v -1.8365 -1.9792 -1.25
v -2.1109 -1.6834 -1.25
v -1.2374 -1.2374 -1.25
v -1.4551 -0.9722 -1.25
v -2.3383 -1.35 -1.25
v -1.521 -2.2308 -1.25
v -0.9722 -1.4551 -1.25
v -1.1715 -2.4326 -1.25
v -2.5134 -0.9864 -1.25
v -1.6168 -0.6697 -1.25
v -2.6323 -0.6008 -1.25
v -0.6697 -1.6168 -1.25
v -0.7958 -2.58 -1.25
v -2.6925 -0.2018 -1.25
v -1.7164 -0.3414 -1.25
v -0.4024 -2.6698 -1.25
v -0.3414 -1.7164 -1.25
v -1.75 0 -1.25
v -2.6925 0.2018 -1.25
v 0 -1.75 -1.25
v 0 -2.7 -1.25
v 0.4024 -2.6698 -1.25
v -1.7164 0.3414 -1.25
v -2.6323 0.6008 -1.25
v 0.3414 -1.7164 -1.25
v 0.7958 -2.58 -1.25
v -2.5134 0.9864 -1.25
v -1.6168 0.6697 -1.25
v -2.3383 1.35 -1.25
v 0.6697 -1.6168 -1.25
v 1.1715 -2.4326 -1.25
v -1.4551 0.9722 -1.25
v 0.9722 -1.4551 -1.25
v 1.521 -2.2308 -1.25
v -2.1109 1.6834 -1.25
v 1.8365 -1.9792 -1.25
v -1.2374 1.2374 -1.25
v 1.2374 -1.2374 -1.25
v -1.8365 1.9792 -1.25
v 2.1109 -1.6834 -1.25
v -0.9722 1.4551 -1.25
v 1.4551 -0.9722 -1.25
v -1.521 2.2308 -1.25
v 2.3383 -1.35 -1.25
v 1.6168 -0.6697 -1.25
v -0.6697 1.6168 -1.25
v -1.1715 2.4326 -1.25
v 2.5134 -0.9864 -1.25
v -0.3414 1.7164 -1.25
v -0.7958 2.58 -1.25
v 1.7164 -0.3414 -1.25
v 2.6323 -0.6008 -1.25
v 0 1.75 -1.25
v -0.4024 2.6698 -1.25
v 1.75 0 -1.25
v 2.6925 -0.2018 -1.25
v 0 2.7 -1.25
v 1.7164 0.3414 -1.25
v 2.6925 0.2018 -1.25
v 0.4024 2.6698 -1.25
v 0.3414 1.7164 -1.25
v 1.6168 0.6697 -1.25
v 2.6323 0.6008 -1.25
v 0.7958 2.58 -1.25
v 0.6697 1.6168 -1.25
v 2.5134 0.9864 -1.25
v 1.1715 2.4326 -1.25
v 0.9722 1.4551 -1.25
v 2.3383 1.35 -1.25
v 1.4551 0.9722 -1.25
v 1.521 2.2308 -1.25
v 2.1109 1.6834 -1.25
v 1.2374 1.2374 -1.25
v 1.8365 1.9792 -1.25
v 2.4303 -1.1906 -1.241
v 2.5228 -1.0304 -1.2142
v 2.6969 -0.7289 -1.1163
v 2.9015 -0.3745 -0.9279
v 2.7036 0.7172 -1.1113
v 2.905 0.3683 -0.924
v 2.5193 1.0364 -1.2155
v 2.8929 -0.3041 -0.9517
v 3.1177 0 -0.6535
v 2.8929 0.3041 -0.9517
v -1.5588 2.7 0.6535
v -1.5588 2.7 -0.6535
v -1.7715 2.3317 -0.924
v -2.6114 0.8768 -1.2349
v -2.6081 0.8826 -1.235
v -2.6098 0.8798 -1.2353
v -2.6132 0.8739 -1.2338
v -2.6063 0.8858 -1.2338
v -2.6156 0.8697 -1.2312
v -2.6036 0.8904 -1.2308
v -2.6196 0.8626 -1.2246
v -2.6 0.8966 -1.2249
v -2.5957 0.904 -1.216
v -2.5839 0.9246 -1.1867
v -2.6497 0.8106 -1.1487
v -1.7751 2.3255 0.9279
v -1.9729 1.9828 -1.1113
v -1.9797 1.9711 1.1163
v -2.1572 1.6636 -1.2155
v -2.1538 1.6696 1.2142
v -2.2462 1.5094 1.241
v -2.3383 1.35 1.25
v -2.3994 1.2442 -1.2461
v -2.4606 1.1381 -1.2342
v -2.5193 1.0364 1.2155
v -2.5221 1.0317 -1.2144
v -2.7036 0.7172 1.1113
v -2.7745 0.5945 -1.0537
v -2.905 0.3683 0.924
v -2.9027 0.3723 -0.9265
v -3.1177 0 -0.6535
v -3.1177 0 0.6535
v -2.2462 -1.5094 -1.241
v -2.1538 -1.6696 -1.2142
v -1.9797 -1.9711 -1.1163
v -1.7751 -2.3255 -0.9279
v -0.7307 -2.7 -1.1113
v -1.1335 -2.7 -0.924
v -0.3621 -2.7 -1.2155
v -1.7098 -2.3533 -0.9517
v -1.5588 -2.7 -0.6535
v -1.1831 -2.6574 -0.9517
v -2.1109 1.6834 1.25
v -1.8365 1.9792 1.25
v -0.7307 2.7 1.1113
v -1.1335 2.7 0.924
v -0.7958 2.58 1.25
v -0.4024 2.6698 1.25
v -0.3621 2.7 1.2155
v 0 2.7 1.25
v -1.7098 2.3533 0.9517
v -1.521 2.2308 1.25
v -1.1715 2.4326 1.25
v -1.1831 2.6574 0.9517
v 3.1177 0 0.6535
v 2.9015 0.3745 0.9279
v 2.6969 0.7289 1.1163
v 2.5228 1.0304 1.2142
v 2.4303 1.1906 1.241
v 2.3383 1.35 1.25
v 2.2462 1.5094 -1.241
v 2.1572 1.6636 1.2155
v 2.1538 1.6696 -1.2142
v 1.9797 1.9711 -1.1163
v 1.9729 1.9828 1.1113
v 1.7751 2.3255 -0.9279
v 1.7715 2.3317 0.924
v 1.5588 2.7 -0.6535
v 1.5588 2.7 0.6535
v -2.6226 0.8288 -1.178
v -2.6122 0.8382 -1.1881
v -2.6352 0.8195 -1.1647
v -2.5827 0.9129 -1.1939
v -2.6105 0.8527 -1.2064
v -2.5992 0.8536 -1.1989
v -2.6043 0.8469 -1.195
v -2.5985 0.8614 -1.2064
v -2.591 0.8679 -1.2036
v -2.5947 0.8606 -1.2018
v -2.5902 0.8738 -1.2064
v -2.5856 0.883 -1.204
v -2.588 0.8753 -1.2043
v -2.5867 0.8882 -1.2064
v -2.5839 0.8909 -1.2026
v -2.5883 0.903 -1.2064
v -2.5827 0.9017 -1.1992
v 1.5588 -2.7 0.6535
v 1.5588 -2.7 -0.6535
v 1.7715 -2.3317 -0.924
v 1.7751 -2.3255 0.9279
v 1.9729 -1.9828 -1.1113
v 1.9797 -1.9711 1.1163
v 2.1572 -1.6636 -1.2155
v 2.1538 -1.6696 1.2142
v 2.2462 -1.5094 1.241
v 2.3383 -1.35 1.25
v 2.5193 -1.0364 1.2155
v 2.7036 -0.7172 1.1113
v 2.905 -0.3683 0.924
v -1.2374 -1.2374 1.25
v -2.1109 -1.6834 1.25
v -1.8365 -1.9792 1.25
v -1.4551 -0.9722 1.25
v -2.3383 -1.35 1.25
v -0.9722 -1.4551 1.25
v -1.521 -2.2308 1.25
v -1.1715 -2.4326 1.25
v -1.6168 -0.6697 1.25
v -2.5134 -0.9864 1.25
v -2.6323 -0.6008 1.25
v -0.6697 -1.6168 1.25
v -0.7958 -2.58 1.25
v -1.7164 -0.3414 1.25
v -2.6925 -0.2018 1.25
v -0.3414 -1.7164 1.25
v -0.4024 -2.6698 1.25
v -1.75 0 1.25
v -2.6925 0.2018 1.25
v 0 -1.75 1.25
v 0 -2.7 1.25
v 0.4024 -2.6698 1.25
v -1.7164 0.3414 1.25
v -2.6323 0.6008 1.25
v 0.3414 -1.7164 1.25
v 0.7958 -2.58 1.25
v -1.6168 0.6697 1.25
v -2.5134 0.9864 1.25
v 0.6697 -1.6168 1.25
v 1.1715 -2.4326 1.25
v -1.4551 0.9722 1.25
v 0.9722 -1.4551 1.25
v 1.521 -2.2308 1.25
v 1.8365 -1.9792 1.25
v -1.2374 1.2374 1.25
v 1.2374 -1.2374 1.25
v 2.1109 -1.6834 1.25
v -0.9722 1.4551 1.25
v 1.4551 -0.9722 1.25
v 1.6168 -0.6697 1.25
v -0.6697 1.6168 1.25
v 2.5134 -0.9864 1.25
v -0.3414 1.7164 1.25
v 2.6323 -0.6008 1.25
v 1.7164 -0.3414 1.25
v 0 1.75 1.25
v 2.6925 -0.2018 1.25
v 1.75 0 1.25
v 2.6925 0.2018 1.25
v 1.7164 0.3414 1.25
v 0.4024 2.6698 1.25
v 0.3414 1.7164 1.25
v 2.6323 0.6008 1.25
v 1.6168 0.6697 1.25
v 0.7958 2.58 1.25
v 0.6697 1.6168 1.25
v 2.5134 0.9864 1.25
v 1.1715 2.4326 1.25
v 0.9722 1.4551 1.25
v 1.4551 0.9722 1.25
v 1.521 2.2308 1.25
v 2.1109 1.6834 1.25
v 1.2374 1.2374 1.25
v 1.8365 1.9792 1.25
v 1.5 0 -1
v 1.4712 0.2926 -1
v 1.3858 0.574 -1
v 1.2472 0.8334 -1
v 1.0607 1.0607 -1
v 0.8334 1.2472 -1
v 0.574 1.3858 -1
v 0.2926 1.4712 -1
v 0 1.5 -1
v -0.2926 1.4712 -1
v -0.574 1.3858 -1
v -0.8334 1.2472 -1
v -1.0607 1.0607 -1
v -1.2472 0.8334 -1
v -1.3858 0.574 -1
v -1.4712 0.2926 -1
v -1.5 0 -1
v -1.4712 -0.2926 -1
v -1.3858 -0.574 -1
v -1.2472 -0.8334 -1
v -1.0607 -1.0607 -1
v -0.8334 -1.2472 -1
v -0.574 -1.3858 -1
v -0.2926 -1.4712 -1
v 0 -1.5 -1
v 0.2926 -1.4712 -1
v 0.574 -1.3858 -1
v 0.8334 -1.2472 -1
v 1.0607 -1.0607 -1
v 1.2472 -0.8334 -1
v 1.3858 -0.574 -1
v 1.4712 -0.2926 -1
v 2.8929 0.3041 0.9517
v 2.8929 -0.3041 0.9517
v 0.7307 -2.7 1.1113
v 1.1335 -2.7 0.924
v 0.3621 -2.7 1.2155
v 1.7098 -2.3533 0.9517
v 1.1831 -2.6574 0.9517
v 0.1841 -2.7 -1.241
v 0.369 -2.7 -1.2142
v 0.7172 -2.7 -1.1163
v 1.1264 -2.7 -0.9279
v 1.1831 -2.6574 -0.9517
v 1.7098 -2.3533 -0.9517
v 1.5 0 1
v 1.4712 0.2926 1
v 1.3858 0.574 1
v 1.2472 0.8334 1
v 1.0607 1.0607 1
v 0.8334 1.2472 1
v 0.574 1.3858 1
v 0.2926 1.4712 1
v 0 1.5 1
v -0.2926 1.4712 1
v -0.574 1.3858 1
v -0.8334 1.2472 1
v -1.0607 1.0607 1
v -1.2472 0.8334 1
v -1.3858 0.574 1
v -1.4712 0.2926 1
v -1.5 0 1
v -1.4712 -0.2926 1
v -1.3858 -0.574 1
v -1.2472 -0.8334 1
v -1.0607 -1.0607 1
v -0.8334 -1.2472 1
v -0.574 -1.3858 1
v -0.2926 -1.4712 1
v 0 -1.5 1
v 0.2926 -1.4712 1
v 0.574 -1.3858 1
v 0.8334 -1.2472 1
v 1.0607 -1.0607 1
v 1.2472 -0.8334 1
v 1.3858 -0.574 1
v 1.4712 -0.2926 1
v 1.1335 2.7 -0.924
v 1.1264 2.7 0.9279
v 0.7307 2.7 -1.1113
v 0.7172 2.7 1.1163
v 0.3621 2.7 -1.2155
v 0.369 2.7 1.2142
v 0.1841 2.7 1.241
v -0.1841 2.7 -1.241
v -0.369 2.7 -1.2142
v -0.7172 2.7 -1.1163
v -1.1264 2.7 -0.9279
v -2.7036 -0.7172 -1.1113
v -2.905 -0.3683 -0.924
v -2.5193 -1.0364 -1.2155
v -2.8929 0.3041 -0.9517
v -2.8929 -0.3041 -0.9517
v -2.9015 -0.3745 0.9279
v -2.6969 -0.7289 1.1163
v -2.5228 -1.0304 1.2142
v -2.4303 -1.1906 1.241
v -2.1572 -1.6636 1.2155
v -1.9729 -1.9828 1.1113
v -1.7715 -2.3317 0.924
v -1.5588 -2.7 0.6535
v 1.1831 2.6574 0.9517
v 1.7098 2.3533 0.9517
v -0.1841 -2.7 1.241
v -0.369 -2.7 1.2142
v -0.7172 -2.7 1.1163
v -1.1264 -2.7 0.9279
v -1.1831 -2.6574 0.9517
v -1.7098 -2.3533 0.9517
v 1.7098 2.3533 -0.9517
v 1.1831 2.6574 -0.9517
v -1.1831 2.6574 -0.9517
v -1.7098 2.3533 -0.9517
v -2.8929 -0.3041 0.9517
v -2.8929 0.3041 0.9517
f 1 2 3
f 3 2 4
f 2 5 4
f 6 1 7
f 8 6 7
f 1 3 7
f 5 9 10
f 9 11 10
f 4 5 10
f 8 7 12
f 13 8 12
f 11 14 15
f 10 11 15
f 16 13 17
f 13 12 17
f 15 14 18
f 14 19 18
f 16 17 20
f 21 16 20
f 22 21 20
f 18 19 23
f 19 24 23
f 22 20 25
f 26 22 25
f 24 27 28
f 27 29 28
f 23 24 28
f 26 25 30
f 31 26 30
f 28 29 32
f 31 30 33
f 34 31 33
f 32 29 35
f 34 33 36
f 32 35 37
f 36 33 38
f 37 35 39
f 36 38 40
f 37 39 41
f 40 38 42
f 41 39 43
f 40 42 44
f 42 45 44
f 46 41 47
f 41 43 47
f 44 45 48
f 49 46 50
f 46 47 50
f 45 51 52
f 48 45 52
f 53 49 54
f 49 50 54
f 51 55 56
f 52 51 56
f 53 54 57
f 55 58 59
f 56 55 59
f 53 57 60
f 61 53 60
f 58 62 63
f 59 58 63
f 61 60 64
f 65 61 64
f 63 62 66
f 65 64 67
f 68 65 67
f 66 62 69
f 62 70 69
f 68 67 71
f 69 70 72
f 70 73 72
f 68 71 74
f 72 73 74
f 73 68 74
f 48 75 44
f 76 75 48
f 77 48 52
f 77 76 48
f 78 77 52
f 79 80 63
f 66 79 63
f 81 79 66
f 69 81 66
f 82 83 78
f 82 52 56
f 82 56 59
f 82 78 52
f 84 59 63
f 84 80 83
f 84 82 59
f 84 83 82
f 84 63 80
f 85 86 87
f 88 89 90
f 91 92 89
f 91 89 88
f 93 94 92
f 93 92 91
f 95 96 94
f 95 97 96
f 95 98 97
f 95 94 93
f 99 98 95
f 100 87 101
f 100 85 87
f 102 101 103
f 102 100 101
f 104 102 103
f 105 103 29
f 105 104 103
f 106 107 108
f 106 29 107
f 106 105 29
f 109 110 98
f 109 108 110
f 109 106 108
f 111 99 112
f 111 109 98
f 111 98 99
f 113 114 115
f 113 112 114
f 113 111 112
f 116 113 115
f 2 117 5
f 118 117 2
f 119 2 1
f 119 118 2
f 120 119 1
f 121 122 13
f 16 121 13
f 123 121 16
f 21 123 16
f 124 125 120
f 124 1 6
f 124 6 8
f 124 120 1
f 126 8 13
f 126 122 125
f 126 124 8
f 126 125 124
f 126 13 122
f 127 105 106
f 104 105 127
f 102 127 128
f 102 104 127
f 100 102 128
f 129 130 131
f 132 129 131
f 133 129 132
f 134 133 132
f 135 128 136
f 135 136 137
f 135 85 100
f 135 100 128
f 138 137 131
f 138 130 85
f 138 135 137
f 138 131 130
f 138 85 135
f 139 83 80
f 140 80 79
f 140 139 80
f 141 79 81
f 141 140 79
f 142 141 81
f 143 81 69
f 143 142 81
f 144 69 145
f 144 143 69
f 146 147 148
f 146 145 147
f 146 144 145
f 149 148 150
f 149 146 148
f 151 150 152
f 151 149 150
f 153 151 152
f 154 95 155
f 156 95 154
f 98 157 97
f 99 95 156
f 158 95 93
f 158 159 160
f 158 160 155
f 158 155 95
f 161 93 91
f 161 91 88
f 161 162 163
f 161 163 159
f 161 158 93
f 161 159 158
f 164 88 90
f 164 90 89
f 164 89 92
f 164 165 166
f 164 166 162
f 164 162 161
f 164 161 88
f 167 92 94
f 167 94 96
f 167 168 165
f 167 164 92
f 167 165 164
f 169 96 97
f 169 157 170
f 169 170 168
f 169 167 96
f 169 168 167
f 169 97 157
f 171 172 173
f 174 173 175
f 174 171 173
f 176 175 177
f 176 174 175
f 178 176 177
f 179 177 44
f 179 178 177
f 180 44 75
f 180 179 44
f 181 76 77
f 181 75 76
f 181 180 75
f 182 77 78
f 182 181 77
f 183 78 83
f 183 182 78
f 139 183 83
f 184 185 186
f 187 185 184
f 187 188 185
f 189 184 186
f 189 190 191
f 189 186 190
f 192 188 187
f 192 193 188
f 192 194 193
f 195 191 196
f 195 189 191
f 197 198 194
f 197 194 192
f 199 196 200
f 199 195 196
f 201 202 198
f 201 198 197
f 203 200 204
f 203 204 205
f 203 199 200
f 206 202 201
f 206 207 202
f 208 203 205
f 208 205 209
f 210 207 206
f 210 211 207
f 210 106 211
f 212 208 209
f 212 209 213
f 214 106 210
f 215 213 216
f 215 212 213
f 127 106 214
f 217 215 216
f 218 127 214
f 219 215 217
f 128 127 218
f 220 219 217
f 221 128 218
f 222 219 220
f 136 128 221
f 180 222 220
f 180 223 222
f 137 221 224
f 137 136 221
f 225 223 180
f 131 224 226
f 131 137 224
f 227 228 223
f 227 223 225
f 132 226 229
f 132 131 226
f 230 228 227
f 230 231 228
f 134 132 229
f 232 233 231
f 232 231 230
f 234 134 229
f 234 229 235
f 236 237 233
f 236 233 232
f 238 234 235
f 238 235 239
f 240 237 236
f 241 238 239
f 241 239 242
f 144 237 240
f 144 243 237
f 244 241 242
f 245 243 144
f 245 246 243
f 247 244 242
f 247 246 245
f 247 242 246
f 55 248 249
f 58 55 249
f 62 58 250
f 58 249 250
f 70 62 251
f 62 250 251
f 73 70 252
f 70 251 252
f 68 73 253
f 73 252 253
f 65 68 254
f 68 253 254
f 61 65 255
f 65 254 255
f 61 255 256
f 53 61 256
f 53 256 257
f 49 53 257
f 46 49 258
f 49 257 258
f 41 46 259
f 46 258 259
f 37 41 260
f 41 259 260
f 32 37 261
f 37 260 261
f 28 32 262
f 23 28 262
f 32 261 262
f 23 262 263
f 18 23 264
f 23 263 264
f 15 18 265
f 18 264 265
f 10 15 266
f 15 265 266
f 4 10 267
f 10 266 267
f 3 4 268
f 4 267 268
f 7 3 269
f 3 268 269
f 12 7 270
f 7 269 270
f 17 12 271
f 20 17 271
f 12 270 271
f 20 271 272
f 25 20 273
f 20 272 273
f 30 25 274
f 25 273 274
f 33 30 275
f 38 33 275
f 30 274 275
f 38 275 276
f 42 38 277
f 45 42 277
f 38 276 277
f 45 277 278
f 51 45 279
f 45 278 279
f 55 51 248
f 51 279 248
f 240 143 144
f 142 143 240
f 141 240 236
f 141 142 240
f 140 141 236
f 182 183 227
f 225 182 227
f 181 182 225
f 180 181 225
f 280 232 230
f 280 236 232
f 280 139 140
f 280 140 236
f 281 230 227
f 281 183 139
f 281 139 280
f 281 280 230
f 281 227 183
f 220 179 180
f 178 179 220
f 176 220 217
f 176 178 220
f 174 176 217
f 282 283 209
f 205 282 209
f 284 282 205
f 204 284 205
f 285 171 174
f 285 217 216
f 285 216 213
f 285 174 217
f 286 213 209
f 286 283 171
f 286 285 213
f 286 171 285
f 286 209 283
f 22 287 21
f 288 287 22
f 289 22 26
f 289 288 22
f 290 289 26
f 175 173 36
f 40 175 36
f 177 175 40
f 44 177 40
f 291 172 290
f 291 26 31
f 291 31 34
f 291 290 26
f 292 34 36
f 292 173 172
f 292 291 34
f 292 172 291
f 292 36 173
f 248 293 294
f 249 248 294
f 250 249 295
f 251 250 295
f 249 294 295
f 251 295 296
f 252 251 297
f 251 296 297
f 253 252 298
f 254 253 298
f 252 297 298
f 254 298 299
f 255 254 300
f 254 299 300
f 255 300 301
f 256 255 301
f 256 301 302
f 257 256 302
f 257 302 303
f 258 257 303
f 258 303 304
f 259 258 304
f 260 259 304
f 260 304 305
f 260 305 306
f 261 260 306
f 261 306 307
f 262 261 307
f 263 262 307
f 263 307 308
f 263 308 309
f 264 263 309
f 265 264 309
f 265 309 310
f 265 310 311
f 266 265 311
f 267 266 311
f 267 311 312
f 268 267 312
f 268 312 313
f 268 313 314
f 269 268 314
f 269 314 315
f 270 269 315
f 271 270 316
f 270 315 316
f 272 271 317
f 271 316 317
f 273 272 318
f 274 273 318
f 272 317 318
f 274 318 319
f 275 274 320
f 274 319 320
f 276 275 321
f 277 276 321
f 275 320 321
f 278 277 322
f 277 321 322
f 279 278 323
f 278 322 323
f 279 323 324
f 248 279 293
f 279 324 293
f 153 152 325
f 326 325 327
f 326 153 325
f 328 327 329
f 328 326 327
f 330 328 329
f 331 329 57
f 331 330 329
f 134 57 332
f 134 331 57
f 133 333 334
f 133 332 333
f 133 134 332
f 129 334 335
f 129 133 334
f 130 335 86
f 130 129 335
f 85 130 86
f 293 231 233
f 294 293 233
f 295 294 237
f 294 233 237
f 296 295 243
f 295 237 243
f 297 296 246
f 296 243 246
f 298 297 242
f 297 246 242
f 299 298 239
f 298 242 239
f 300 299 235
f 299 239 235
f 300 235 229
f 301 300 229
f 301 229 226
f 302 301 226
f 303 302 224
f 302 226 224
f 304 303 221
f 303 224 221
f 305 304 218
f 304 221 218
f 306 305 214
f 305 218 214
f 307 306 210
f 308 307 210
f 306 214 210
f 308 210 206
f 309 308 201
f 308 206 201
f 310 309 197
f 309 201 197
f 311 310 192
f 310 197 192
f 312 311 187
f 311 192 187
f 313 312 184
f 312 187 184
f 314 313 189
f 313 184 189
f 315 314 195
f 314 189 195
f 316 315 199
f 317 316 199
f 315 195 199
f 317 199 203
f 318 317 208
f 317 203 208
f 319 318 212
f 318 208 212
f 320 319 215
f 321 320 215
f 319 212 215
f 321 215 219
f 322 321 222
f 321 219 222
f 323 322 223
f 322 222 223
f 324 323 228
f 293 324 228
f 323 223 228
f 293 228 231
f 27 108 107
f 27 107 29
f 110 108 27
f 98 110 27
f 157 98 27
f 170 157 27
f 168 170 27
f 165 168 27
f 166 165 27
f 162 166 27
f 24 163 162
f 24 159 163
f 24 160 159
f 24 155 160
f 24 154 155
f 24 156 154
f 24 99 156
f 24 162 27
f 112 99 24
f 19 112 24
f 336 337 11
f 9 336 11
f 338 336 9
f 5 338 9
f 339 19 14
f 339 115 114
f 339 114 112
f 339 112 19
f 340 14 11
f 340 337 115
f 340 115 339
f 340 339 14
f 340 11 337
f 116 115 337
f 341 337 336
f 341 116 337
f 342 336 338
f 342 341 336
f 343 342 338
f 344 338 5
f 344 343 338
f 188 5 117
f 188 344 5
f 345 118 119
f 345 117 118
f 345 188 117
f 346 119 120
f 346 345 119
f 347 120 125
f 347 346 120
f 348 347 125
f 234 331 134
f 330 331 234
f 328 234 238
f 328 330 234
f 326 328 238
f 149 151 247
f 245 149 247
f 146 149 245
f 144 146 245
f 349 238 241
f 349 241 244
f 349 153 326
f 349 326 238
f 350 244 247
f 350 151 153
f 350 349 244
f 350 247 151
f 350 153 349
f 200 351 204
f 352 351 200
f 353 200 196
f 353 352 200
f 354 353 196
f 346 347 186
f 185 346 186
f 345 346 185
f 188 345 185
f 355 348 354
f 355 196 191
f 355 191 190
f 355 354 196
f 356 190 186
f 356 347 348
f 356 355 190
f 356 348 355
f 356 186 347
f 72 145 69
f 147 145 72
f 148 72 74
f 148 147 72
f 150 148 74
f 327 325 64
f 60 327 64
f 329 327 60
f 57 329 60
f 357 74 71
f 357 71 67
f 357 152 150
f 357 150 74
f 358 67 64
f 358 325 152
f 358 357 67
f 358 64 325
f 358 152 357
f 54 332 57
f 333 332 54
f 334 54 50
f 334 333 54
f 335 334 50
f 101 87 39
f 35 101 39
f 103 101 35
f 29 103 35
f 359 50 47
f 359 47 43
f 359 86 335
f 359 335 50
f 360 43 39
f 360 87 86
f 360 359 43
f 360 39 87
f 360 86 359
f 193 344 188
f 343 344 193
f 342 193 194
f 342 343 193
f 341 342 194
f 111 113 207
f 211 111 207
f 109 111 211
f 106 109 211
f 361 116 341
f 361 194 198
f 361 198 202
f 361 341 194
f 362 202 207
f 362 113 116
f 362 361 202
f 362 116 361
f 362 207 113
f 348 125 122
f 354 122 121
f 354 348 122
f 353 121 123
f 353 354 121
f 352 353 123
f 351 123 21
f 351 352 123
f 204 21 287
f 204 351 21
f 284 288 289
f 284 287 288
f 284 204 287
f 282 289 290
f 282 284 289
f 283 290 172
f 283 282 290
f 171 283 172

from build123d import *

# Parameters (mm, degrees)
RESSALTO_EXTRUS_O5_DEPTH        = 1.25
ESBO_O28_R                      = 1.5
CORTE_EXTRUS_O8_DEPTH           = 3.5
ESBO_O30_OUTSIDE_W              = 14.862
ESBO_O30_OUTSIDE_H              = 14.026
ESBO_O30_OUTSIDE_R              = 2.7
CORTE_EXTRUS_O9_DEPTH           = 3.5
CORTE_EXTRUS_O9_TAPER           = 35
CORTE_EXTRUS_O9_OTHER_WAY_DEPTH = 1
ESBO_O31_OUTSIDE_W              = 13.46
ESBO_O31_OUTSIDE_H              = 12.624
ESBO_O31_OUTSIDE_R              = 2.7
ESBO_O31_OUTSIDE_R_2            = 0.011999843
CORTE_EXTRUS_O10_DEPTH          = 2.5
CORTE_EXTRUS_O10_TAPER          = 35
CHANFRO3_SIZE                   = 0.25


with BuildPart() as part:
    # Esboço2 → Ressalto-extrusão5 (new body, symmetric)
    with BuildSketch(Plane.XY):
        Polygon((3.117691454, 0), (1.558845727, 2.7), (-1.558845727, 2.7), (-3.117691454, 0), (-1.558845727, -2.7), (1.558845727, -2.7), align=None)
    extrude(amount=RESSALTO_EXTRUS_O5_DEPTH, both=True)

    # Esboço28 → Corte-extrusão8 (cut, through all)
    with BuildSketch(Plane.XY.offset(1.25)):
        Circle(ESBO_O28_R)
    extrude(amount=-CORTE_EXTRUS_O8_DEPTH, mode=Mode.SUBTRACT)

    # Esboço30 outside → Corte-extrusão9 (cut)
    with BuildSketch(Plane.XY.offset(1.25)):
        Rectangle(ESBO_O30_OUTSIDE_W, ESBO_O30_OUTSIDE_H)
        Circle(ESBO_O30_OUTSIDE_R, mode=Mode.SUBTRACT)
    extrude(amount=-CORTE_EXTRUS_O9_DEPTH, taper=CORTE_EXTRUS_O9_TAPER, mode=Mode.SUBTRACT)

    # Esboço30 outside → Corte-extrusão9 other way (cut)
    with BuildSketch(Plane.XY.offset(1.25)):
        Rectangle(ESBO_O30_OUTSIDE_W, ESBO_O30_OUTSIDE_H)
        Circle(ESBO_O30_OUTSIDE_R, mode=Mode.SUBTRACT)
    extrude(amount=CORTE_EXTRUS_O9_OTHER_WAY_DEPTH, mode=Mode.SUBTRACT)

    # Esboço31 outside → Corte-extrusão10 (cut)
    with BuildSketch(Plane(origin=(0, 0, -1.25), x_dir=(-1, 0, 0), z_dir=(0, 0, -1))):
        Rectangle(ESBO_O31_OUTSIDE_W, ESBO_O31_OUTSIDE_H)
        Circle(ESBO_O31_OUTSIDE_R, mode=Mode.SUBTRACT)
        with Locations((2.629062893, 0.890906414)):
            Circle(ESBO_O31_OUTSIDE_R_2, mode=Mode.SUBTRACT)
    extrude(amount=-CORTE_EXTRUS_O10_DEPTH, taper=CORTE_EXTRUS_O10_TAPER, mode=Mode.SUBTRACT)

    # Chanfro3
    chanfro3_edges = [part.edges().sort_by_distance(p)[0] for p in [
        (-1.5, 0, -1.25),
        (-1.5, 0, 1.25),
    ]]
    chamfer(chanfro3_edges, length=CHANFRO3_SIZE)


solid = part.part
